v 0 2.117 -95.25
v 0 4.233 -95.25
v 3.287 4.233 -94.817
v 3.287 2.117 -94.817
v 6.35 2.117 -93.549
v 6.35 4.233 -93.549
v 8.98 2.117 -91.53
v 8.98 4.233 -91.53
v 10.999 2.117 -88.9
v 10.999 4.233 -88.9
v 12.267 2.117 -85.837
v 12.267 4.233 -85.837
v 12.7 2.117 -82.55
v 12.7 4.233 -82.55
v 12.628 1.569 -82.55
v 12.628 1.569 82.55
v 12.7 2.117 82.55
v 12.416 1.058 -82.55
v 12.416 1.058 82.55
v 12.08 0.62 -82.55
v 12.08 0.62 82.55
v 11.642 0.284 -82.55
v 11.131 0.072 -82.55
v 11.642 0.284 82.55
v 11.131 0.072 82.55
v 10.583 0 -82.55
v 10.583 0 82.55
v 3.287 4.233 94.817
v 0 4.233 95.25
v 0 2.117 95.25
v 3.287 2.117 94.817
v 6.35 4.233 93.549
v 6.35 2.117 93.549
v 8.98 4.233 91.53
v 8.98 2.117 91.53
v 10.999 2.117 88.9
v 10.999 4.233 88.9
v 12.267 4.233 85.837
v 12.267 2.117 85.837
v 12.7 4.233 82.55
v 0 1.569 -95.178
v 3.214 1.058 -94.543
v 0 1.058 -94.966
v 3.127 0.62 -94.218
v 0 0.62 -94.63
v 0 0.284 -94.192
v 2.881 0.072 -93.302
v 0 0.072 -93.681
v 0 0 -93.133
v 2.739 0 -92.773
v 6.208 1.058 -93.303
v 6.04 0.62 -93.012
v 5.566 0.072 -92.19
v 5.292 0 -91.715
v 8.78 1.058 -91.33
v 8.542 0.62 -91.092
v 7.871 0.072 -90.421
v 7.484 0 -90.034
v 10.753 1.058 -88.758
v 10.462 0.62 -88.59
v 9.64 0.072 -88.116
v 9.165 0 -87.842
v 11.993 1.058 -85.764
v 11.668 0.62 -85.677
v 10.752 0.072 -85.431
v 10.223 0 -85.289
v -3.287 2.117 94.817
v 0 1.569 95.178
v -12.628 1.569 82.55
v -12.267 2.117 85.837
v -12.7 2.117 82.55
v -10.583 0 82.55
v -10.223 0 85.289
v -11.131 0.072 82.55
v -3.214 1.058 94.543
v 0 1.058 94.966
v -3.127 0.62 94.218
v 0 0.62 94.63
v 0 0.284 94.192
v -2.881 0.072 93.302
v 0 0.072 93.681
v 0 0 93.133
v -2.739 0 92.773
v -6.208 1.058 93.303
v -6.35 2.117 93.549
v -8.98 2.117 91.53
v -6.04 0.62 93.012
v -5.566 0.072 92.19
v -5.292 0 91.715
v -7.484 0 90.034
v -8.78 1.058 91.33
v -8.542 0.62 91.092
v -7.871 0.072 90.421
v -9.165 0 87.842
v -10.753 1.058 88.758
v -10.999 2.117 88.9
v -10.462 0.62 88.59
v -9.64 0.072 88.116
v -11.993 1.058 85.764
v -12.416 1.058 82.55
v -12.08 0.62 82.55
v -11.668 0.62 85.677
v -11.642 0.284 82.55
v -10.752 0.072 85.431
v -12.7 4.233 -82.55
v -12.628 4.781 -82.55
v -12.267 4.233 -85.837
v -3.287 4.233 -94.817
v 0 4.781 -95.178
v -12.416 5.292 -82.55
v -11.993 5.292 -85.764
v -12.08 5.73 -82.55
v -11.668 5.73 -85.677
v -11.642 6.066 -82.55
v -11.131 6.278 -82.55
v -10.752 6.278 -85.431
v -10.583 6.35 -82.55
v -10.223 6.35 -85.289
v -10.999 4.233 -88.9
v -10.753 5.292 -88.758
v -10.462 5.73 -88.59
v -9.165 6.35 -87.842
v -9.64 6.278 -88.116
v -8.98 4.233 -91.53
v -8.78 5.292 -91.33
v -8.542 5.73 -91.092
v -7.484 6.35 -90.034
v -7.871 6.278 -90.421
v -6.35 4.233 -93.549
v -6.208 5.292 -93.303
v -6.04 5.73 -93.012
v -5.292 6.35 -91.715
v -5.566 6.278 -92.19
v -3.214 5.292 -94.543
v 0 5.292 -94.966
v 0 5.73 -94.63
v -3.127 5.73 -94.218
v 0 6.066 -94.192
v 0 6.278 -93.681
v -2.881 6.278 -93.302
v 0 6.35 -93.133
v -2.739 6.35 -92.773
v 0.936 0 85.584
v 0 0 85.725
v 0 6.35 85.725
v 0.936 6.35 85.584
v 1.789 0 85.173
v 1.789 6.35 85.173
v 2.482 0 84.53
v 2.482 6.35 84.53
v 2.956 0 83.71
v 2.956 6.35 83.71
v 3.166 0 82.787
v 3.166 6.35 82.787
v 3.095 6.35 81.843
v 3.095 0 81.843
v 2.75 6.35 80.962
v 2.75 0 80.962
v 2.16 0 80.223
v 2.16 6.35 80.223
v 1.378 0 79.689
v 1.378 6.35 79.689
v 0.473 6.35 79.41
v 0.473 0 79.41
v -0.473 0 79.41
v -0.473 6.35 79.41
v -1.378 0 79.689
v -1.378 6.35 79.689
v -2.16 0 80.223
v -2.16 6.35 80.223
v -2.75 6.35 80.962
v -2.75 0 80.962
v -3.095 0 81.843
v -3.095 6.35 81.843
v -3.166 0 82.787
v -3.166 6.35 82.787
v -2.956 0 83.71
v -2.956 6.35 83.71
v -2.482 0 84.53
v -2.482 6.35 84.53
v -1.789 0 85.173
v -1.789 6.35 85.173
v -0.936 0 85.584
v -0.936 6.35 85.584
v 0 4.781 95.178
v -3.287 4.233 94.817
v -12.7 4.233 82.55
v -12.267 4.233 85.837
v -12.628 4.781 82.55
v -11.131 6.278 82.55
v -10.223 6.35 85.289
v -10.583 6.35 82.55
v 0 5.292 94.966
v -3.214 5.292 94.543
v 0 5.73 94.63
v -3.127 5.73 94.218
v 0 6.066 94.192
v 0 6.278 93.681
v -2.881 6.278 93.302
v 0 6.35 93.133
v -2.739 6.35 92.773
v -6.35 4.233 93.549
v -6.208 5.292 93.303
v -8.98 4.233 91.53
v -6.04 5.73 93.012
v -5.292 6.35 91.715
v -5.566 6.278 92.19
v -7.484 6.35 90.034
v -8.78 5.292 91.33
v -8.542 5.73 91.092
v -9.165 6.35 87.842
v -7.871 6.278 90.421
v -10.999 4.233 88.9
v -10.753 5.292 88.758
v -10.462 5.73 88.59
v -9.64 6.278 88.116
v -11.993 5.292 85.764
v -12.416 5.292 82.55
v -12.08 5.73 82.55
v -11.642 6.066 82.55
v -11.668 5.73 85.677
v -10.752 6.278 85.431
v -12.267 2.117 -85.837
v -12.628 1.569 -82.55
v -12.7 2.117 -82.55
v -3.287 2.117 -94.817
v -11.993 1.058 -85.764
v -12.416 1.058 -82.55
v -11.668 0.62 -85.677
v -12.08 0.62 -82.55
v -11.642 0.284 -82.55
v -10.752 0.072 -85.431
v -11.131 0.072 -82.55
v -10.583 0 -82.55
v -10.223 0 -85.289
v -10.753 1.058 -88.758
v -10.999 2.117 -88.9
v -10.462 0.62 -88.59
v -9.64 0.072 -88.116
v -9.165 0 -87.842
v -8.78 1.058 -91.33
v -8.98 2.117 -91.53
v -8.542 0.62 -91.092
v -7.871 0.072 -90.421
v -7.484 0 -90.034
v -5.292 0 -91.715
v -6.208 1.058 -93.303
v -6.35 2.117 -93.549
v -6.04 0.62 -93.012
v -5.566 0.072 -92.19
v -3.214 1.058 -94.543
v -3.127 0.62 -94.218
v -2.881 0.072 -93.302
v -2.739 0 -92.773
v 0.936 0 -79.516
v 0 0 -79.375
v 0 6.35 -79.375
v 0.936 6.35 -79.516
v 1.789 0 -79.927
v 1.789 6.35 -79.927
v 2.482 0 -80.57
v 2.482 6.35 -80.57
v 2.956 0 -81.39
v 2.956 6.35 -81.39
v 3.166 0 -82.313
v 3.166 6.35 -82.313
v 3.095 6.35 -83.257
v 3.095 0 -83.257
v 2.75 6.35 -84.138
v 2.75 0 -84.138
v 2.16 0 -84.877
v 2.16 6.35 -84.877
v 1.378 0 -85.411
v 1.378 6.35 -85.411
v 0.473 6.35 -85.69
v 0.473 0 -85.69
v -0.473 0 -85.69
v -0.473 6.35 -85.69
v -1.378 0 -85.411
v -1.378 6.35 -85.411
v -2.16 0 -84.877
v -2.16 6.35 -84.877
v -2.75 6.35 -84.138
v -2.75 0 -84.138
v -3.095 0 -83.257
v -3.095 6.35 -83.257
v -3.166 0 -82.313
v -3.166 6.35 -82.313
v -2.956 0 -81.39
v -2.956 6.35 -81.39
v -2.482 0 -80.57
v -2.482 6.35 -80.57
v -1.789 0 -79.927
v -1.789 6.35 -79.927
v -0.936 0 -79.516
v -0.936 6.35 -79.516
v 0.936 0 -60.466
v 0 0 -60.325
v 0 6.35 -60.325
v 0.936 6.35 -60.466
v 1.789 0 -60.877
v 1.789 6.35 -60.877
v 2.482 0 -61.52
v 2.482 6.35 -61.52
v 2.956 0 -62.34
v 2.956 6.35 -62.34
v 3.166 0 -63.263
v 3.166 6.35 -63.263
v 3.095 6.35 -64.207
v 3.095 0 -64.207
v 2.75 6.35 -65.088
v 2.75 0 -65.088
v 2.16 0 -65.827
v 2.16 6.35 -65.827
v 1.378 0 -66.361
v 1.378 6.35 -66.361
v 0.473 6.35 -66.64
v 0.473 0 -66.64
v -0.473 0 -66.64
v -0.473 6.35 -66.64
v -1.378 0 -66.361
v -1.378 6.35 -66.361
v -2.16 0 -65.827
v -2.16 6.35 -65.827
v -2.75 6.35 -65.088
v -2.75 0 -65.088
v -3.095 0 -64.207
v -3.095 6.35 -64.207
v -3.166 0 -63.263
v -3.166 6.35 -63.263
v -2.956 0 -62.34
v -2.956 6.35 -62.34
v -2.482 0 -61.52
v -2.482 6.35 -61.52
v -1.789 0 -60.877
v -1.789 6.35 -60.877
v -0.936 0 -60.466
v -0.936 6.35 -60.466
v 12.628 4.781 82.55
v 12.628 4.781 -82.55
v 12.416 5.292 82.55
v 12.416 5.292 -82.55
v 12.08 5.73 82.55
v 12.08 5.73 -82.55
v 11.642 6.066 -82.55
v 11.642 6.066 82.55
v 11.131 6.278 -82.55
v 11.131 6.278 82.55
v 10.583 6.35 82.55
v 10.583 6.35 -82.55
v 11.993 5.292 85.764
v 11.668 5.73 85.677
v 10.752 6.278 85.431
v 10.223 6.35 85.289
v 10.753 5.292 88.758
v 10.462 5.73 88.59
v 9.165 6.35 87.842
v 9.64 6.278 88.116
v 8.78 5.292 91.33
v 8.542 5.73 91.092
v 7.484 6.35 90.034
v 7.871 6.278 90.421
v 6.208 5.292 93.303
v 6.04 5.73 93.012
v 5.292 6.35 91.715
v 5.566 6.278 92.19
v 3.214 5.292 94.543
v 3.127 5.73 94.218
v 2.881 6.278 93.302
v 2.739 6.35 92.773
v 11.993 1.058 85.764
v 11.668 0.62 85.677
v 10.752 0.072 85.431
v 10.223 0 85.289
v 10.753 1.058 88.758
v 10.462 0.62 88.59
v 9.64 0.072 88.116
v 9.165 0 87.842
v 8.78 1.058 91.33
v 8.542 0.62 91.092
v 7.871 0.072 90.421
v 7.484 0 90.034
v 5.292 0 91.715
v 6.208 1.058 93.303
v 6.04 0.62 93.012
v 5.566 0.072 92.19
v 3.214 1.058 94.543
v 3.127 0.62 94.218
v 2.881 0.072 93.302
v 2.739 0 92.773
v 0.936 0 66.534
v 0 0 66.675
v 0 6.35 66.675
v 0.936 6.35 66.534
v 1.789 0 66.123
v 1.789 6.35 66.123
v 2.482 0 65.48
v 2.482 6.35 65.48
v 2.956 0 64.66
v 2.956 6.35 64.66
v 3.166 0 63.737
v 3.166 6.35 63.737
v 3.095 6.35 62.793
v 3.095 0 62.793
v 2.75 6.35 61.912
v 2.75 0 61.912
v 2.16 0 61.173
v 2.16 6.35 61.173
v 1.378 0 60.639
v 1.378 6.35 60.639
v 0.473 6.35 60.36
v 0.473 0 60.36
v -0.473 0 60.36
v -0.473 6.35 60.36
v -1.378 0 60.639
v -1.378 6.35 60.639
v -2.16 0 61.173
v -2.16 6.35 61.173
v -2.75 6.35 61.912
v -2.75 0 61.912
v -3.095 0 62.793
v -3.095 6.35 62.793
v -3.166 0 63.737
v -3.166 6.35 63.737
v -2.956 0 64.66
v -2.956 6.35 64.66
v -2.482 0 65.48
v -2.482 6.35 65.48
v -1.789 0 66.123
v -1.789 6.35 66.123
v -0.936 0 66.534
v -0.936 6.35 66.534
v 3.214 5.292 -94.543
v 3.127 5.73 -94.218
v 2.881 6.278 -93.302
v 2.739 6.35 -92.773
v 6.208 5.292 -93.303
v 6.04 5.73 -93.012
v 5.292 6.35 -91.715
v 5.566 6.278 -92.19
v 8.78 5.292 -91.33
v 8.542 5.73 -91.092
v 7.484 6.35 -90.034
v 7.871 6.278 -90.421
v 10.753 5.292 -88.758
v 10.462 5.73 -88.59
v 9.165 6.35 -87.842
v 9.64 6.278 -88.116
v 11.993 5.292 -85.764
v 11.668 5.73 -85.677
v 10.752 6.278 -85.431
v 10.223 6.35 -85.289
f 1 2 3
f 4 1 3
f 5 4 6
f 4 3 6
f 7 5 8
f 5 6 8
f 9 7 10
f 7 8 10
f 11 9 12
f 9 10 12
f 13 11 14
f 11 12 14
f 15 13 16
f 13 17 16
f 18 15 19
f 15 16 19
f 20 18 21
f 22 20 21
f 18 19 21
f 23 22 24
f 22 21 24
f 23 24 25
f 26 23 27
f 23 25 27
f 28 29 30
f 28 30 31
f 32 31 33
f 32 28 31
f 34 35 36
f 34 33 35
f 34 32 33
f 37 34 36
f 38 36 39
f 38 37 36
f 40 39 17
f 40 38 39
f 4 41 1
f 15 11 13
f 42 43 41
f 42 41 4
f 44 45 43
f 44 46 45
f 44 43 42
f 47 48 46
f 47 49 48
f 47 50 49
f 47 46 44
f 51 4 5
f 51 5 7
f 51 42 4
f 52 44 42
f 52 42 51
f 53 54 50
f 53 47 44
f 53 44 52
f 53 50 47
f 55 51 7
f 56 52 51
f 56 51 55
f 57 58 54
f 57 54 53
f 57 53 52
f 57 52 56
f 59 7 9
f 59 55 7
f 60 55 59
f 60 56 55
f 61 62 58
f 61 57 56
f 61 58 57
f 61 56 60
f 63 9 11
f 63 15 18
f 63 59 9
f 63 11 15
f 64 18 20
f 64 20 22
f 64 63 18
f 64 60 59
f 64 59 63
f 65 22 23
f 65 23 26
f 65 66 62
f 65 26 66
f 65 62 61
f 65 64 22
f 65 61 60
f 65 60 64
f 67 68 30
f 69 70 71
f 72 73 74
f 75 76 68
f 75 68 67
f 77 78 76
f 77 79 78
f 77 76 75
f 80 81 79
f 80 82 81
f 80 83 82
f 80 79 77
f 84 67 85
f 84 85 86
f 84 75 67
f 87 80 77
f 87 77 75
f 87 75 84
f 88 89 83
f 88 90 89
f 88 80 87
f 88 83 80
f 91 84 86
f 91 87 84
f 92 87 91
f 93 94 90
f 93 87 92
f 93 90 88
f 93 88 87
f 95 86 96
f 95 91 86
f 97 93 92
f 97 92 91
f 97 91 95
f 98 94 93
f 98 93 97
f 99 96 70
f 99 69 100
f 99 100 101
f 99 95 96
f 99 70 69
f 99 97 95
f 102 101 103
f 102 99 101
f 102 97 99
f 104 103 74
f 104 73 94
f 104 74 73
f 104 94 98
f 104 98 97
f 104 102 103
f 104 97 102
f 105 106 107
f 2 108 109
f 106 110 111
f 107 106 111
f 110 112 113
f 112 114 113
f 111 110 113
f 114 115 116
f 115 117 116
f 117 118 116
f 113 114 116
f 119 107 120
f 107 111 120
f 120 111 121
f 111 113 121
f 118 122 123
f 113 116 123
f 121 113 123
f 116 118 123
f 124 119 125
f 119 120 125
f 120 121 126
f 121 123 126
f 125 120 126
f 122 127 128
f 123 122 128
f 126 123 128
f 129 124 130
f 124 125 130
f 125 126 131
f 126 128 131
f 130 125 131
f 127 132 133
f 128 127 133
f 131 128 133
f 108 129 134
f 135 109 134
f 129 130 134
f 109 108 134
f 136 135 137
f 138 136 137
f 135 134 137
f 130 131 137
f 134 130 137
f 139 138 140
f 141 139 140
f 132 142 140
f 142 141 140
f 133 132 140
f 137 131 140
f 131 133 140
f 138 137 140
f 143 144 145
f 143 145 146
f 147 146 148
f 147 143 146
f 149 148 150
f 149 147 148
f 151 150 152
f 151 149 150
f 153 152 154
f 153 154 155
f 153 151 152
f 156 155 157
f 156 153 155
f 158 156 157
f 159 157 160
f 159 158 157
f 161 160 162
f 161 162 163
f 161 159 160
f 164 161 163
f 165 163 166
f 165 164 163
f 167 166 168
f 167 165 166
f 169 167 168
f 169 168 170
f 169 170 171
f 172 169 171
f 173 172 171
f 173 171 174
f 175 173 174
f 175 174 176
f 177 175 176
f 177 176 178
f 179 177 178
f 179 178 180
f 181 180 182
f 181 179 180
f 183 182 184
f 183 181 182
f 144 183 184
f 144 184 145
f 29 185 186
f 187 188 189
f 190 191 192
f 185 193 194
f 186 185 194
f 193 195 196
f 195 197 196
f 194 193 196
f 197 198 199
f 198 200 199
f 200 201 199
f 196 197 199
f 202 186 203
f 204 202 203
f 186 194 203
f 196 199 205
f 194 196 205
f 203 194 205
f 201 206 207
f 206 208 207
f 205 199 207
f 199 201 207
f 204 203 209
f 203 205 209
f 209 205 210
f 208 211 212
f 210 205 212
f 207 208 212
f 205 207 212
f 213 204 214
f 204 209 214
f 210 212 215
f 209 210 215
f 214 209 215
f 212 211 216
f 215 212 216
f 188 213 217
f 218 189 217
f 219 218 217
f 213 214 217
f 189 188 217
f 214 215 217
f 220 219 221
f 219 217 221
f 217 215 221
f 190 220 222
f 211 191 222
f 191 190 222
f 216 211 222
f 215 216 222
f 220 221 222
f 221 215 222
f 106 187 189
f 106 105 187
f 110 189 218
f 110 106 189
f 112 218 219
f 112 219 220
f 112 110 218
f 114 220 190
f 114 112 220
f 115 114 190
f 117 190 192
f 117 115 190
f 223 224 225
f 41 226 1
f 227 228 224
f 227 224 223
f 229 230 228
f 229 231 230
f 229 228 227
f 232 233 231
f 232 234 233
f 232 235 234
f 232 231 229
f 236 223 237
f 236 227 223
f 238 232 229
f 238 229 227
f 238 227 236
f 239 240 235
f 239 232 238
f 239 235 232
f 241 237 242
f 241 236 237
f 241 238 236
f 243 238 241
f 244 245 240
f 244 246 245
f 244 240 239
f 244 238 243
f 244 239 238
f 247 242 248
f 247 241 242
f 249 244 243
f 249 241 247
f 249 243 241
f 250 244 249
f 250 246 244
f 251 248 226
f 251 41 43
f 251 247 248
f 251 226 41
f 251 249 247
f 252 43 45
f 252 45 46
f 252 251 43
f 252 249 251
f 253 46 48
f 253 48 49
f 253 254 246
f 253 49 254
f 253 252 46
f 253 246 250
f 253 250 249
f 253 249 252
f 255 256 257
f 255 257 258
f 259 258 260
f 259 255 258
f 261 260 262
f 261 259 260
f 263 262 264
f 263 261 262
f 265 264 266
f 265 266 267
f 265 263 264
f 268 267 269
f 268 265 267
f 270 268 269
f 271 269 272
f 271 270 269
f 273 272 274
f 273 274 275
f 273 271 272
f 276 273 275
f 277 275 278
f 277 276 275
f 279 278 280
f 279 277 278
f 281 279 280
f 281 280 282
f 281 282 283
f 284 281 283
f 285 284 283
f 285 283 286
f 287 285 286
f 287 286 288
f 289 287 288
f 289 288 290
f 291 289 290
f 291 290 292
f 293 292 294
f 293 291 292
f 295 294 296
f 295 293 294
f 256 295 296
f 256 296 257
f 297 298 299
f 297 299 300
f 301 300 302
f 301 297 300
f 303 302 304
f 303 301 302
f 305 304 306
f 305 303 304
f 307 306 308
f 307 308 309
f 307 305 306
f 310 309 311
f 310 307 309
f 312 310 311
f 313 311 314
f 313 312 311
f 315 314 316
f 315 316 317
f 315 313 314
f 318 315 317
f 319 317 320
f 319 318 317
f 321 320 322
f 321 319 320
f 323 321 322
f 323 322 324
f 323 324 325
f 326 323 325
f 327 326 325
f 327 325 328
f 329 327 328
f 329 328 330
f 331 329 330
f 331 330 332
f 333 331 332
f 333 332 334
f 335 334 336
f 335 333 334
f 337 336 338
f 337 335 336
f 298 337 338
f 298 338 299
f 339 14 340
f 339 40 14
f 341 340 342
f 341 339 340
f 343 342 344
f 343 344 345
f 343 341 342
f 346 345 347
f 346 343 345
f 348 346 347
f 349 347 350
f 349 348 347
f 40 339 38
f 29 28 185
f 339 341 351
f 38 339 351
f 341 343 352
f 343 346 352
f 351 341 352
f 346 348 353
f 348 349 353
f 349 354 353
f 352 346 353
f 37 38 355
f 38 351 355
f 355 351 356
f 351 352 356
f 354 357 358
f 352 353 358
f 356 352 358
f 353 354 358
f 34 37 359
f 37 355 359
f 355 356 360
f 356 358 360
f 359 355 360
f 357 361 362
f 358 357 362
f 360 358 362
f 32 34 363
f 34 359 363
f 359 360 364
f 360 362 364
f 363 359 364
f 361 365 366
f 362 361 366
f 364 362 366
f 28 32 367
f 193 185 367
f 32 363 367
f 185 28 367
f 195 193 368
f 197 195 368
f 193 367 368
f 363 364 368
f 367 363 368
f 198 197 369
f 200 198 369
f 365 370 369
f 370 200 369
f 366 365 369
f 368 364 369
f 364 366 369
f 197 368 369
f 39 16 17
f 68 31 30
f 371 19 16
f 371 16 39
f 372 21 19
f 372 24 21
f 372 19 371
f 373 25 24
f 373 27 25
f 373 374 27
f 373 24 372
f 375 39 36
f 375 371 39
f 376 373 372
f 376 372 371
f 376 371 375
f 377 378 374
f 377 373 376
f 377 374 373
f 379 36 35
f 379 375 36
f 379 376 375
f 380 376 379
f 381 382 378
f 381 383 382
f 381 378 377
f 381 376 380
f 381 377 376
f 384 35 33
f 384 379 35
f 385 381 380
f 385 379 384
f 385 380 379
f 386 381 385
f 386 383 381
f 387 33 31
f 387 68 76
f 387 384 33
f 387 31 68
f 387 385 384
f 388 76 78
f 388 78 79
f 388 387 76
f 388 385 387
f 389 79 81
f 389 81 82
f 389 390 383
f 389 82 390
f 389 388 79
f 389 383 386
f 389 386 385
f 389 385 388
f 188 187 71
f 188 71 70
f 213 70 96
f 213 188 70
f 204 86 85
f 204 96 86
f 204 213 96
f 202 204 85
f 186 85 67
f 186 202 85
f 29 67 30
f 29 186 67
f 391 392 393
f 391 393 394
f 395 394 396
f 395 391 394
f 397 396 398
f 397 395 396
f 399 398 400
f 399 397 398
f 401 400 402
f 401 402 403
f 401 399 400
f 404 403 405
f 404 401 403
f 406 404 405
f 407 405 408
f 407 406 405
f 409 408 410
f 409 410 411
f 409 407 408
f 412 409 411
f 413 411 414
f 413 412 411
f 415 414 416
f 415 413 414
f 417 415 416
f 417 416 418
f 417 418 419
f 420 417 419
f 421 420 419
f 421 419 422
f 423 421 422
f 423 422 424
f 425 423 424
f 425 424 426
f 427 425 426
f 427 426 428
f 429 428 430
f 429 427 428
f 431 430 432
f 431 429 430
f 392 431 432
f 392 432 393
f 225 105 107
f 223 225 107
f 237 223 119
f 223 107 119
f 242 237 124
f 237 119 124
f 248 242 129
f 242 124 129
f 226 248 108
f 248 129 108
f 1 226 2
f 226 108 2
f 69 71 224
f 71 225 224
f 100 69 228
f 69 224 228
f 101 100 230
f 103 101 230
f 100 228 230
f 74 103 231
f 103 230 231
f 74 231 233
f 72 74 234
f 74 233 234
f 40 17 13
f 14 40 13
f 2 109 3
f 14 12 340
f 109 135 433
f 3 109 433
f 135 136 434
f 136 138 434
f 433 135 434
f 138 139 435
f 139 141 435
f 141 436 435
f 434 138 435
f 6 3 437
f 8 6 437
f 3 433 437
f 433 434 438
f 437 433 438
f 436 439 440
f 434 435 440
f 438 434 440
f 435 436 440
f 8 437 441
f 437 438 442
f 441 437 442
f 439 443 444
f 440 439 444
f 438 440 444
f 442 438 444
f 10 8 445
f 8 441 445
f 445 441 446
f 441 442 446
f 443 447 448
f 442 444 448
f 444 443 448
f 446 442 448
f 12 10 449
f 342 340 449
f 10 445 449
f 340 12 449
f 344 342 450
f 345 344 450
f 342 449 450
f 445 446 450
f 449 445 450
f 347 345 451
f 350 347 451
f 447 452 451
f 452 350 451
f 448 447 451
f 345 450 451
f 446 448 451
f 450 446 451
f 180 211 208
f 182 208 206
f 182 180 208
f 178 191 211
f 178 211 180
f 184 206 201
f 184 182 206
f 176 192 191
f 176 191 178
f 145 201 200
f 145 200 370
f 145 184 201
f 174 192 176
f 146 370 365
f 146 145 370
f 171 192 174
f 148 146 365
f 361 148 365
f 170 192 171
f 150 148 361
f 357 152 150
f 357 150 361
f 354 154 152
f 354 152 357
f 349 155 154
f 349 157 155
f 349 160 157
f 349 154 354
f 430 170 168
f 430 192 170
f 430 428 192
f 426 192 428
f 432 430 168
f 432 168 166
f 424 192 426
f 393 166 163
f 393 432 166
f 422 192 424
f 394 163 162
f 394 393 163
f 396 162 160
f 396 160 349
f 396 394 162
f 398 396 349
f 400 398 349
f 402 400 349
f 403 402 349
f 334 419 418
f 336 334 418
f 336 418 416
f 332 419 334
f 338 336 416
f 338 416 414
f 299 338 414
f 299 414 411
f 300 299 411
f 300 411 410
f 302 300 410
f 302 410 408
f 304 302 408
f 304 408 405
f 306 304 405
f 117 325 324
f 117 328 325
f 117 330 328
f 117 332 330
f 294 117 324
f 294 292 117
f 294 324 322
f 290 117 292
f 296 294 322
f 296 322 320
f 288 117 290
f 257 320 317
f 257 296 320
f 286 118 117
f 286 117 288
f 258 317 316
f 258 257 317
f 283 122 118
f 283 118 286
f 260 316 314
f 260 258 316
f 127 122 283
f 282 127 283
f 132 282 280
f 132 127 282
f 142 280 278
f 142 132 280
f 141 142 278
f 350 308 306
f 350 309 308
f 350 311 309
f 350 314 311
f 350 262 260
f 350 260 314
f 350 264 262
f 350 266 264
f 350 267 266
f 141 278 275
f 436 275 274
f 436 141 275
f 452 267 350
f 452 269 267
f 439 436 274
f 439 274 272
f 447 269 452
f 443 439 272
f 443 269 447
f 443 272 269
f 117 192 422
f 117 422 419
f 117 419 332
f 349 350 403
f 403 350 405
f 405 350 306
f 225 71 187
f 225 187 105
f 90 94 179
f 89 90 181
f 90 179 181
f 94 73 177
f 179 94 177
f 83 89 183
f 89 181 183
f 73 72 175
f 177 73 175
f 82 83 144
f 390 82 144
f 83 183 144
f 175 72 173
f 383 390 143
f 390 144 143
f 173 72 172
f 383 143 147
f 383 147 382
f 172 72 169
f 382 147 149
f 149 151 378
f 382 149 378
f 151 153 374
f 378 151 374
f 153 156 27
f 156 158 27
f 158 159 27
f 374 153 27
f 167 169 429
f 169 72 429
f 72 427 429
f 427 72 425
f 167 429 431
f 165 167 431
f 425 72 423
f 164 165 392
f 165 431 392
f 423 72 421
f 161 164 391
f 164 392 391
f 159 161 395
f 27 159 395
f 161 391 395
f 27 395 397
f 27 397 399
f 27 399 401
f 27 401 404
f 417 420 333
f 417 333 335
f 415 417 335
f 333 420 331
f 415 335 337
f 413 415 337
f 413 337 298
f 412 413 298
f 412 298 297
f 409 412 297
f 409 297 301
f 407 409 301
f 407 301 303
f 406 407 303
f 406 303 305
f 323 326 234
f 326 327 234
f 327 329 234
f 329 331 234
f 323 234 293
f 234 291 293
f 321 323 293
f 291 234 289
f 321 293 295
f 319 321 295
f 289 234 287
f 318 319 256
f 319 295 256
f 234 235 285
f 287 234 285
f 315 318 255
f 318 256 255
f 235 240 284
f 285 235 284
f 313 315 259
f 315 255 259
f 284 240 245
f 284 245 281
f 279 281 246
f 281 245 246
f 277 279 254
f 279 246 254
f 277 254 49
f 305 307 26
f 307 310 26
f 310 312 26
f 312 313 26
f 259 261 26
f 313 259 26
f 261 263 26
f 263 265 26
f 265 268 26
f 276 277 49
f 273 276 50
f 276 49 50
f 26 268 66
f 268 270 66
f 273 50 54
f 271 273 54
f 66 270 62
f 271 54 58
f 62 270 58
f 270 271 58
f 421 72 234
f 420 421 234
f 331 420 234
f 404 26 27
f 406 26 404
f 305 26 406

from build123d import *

# Parameters (mm, degrees)
SKETCH1_W           = 25.4
SKETCH1_H           = 190.5
SKETCH1_R           = 3.175
BOSS_EXTRUDE1_DEPTH = 6.35
FILLET2_R           = 12.7
FILLET3_R           = 2.116666667


with BuildPart() as part:
    # Sketch1 → Boss-Extrude1 (new body)
    with BuildSketch(Plane(origin=(0, 0, 0), x_dir=(1, 0, 0), z_dir=(0, 1, 0))):
        Rectangle(SKETCH1_W, SKETCH1_H)
        with Locations(Location((0, -82.55, 0), (0, 0, 270))):
            Circle(SKETCH1_R, mode=Mode.SUBTRACT)
        with Locations(Location((0, 63.5, 0), (0, 0, 270))):
            Circle(SKETCH1_R, mode=Mode.SUBTRACT)
        with Locations(Location((0, 82.55, 0), (0, 0, 270))):
            Circle(SKETCH1_R, mode=Mode.SUBTRACT)
        with Locations(Location((0, -63.5, 0), (0, 0, 270))):
            Circle(SKETCH1_R, mode=Mode.SUBTRACT)
    extrude(amount=BOSS_EXTRUDE1_DEPTH)

    # Fillet2
    fillet2_edges = [part.edges().sort_by_distance(p)[0] for p in [
        (-12.7, 3.175, -95.25),
        (12.7, 3.175, -95.25),
        (-12.7, 3.175, 95.25),
        (12.7, 3.175, 95.25),
    ]]
    fillet(fillet2_edges, radius=FILLET2_R - 0.0001)  # a hair under: the kernel refuses the full size

    # Fillet3
    fillet3_edges = [part.edges().sort_by_distance(p)[0] for p in [
        (-12.7, 0, 0),
        (-12.7, 6.35, 0),
        (12.7, 0, 0),
        (8.98028541, 0, 91.53028541),
        (-8.98028541, 0, 91.53028541),
        (8.98028541, 0, -91.53028541),
        (-8.98028541, 0, -91.53028541),
        (12.7, 6.35, 0),
        (8.98028541, 6.35, 91.53028541),
        (-8.98028541, 6.35, 91.53028541),
        (8.98028541, 6.35, -91.53028541),
        (-8.98028541, 6.35, -91.53028541),
    ]]
    fillet(fillet3_edges, radius=FILLET3_R)


solid = part.part
